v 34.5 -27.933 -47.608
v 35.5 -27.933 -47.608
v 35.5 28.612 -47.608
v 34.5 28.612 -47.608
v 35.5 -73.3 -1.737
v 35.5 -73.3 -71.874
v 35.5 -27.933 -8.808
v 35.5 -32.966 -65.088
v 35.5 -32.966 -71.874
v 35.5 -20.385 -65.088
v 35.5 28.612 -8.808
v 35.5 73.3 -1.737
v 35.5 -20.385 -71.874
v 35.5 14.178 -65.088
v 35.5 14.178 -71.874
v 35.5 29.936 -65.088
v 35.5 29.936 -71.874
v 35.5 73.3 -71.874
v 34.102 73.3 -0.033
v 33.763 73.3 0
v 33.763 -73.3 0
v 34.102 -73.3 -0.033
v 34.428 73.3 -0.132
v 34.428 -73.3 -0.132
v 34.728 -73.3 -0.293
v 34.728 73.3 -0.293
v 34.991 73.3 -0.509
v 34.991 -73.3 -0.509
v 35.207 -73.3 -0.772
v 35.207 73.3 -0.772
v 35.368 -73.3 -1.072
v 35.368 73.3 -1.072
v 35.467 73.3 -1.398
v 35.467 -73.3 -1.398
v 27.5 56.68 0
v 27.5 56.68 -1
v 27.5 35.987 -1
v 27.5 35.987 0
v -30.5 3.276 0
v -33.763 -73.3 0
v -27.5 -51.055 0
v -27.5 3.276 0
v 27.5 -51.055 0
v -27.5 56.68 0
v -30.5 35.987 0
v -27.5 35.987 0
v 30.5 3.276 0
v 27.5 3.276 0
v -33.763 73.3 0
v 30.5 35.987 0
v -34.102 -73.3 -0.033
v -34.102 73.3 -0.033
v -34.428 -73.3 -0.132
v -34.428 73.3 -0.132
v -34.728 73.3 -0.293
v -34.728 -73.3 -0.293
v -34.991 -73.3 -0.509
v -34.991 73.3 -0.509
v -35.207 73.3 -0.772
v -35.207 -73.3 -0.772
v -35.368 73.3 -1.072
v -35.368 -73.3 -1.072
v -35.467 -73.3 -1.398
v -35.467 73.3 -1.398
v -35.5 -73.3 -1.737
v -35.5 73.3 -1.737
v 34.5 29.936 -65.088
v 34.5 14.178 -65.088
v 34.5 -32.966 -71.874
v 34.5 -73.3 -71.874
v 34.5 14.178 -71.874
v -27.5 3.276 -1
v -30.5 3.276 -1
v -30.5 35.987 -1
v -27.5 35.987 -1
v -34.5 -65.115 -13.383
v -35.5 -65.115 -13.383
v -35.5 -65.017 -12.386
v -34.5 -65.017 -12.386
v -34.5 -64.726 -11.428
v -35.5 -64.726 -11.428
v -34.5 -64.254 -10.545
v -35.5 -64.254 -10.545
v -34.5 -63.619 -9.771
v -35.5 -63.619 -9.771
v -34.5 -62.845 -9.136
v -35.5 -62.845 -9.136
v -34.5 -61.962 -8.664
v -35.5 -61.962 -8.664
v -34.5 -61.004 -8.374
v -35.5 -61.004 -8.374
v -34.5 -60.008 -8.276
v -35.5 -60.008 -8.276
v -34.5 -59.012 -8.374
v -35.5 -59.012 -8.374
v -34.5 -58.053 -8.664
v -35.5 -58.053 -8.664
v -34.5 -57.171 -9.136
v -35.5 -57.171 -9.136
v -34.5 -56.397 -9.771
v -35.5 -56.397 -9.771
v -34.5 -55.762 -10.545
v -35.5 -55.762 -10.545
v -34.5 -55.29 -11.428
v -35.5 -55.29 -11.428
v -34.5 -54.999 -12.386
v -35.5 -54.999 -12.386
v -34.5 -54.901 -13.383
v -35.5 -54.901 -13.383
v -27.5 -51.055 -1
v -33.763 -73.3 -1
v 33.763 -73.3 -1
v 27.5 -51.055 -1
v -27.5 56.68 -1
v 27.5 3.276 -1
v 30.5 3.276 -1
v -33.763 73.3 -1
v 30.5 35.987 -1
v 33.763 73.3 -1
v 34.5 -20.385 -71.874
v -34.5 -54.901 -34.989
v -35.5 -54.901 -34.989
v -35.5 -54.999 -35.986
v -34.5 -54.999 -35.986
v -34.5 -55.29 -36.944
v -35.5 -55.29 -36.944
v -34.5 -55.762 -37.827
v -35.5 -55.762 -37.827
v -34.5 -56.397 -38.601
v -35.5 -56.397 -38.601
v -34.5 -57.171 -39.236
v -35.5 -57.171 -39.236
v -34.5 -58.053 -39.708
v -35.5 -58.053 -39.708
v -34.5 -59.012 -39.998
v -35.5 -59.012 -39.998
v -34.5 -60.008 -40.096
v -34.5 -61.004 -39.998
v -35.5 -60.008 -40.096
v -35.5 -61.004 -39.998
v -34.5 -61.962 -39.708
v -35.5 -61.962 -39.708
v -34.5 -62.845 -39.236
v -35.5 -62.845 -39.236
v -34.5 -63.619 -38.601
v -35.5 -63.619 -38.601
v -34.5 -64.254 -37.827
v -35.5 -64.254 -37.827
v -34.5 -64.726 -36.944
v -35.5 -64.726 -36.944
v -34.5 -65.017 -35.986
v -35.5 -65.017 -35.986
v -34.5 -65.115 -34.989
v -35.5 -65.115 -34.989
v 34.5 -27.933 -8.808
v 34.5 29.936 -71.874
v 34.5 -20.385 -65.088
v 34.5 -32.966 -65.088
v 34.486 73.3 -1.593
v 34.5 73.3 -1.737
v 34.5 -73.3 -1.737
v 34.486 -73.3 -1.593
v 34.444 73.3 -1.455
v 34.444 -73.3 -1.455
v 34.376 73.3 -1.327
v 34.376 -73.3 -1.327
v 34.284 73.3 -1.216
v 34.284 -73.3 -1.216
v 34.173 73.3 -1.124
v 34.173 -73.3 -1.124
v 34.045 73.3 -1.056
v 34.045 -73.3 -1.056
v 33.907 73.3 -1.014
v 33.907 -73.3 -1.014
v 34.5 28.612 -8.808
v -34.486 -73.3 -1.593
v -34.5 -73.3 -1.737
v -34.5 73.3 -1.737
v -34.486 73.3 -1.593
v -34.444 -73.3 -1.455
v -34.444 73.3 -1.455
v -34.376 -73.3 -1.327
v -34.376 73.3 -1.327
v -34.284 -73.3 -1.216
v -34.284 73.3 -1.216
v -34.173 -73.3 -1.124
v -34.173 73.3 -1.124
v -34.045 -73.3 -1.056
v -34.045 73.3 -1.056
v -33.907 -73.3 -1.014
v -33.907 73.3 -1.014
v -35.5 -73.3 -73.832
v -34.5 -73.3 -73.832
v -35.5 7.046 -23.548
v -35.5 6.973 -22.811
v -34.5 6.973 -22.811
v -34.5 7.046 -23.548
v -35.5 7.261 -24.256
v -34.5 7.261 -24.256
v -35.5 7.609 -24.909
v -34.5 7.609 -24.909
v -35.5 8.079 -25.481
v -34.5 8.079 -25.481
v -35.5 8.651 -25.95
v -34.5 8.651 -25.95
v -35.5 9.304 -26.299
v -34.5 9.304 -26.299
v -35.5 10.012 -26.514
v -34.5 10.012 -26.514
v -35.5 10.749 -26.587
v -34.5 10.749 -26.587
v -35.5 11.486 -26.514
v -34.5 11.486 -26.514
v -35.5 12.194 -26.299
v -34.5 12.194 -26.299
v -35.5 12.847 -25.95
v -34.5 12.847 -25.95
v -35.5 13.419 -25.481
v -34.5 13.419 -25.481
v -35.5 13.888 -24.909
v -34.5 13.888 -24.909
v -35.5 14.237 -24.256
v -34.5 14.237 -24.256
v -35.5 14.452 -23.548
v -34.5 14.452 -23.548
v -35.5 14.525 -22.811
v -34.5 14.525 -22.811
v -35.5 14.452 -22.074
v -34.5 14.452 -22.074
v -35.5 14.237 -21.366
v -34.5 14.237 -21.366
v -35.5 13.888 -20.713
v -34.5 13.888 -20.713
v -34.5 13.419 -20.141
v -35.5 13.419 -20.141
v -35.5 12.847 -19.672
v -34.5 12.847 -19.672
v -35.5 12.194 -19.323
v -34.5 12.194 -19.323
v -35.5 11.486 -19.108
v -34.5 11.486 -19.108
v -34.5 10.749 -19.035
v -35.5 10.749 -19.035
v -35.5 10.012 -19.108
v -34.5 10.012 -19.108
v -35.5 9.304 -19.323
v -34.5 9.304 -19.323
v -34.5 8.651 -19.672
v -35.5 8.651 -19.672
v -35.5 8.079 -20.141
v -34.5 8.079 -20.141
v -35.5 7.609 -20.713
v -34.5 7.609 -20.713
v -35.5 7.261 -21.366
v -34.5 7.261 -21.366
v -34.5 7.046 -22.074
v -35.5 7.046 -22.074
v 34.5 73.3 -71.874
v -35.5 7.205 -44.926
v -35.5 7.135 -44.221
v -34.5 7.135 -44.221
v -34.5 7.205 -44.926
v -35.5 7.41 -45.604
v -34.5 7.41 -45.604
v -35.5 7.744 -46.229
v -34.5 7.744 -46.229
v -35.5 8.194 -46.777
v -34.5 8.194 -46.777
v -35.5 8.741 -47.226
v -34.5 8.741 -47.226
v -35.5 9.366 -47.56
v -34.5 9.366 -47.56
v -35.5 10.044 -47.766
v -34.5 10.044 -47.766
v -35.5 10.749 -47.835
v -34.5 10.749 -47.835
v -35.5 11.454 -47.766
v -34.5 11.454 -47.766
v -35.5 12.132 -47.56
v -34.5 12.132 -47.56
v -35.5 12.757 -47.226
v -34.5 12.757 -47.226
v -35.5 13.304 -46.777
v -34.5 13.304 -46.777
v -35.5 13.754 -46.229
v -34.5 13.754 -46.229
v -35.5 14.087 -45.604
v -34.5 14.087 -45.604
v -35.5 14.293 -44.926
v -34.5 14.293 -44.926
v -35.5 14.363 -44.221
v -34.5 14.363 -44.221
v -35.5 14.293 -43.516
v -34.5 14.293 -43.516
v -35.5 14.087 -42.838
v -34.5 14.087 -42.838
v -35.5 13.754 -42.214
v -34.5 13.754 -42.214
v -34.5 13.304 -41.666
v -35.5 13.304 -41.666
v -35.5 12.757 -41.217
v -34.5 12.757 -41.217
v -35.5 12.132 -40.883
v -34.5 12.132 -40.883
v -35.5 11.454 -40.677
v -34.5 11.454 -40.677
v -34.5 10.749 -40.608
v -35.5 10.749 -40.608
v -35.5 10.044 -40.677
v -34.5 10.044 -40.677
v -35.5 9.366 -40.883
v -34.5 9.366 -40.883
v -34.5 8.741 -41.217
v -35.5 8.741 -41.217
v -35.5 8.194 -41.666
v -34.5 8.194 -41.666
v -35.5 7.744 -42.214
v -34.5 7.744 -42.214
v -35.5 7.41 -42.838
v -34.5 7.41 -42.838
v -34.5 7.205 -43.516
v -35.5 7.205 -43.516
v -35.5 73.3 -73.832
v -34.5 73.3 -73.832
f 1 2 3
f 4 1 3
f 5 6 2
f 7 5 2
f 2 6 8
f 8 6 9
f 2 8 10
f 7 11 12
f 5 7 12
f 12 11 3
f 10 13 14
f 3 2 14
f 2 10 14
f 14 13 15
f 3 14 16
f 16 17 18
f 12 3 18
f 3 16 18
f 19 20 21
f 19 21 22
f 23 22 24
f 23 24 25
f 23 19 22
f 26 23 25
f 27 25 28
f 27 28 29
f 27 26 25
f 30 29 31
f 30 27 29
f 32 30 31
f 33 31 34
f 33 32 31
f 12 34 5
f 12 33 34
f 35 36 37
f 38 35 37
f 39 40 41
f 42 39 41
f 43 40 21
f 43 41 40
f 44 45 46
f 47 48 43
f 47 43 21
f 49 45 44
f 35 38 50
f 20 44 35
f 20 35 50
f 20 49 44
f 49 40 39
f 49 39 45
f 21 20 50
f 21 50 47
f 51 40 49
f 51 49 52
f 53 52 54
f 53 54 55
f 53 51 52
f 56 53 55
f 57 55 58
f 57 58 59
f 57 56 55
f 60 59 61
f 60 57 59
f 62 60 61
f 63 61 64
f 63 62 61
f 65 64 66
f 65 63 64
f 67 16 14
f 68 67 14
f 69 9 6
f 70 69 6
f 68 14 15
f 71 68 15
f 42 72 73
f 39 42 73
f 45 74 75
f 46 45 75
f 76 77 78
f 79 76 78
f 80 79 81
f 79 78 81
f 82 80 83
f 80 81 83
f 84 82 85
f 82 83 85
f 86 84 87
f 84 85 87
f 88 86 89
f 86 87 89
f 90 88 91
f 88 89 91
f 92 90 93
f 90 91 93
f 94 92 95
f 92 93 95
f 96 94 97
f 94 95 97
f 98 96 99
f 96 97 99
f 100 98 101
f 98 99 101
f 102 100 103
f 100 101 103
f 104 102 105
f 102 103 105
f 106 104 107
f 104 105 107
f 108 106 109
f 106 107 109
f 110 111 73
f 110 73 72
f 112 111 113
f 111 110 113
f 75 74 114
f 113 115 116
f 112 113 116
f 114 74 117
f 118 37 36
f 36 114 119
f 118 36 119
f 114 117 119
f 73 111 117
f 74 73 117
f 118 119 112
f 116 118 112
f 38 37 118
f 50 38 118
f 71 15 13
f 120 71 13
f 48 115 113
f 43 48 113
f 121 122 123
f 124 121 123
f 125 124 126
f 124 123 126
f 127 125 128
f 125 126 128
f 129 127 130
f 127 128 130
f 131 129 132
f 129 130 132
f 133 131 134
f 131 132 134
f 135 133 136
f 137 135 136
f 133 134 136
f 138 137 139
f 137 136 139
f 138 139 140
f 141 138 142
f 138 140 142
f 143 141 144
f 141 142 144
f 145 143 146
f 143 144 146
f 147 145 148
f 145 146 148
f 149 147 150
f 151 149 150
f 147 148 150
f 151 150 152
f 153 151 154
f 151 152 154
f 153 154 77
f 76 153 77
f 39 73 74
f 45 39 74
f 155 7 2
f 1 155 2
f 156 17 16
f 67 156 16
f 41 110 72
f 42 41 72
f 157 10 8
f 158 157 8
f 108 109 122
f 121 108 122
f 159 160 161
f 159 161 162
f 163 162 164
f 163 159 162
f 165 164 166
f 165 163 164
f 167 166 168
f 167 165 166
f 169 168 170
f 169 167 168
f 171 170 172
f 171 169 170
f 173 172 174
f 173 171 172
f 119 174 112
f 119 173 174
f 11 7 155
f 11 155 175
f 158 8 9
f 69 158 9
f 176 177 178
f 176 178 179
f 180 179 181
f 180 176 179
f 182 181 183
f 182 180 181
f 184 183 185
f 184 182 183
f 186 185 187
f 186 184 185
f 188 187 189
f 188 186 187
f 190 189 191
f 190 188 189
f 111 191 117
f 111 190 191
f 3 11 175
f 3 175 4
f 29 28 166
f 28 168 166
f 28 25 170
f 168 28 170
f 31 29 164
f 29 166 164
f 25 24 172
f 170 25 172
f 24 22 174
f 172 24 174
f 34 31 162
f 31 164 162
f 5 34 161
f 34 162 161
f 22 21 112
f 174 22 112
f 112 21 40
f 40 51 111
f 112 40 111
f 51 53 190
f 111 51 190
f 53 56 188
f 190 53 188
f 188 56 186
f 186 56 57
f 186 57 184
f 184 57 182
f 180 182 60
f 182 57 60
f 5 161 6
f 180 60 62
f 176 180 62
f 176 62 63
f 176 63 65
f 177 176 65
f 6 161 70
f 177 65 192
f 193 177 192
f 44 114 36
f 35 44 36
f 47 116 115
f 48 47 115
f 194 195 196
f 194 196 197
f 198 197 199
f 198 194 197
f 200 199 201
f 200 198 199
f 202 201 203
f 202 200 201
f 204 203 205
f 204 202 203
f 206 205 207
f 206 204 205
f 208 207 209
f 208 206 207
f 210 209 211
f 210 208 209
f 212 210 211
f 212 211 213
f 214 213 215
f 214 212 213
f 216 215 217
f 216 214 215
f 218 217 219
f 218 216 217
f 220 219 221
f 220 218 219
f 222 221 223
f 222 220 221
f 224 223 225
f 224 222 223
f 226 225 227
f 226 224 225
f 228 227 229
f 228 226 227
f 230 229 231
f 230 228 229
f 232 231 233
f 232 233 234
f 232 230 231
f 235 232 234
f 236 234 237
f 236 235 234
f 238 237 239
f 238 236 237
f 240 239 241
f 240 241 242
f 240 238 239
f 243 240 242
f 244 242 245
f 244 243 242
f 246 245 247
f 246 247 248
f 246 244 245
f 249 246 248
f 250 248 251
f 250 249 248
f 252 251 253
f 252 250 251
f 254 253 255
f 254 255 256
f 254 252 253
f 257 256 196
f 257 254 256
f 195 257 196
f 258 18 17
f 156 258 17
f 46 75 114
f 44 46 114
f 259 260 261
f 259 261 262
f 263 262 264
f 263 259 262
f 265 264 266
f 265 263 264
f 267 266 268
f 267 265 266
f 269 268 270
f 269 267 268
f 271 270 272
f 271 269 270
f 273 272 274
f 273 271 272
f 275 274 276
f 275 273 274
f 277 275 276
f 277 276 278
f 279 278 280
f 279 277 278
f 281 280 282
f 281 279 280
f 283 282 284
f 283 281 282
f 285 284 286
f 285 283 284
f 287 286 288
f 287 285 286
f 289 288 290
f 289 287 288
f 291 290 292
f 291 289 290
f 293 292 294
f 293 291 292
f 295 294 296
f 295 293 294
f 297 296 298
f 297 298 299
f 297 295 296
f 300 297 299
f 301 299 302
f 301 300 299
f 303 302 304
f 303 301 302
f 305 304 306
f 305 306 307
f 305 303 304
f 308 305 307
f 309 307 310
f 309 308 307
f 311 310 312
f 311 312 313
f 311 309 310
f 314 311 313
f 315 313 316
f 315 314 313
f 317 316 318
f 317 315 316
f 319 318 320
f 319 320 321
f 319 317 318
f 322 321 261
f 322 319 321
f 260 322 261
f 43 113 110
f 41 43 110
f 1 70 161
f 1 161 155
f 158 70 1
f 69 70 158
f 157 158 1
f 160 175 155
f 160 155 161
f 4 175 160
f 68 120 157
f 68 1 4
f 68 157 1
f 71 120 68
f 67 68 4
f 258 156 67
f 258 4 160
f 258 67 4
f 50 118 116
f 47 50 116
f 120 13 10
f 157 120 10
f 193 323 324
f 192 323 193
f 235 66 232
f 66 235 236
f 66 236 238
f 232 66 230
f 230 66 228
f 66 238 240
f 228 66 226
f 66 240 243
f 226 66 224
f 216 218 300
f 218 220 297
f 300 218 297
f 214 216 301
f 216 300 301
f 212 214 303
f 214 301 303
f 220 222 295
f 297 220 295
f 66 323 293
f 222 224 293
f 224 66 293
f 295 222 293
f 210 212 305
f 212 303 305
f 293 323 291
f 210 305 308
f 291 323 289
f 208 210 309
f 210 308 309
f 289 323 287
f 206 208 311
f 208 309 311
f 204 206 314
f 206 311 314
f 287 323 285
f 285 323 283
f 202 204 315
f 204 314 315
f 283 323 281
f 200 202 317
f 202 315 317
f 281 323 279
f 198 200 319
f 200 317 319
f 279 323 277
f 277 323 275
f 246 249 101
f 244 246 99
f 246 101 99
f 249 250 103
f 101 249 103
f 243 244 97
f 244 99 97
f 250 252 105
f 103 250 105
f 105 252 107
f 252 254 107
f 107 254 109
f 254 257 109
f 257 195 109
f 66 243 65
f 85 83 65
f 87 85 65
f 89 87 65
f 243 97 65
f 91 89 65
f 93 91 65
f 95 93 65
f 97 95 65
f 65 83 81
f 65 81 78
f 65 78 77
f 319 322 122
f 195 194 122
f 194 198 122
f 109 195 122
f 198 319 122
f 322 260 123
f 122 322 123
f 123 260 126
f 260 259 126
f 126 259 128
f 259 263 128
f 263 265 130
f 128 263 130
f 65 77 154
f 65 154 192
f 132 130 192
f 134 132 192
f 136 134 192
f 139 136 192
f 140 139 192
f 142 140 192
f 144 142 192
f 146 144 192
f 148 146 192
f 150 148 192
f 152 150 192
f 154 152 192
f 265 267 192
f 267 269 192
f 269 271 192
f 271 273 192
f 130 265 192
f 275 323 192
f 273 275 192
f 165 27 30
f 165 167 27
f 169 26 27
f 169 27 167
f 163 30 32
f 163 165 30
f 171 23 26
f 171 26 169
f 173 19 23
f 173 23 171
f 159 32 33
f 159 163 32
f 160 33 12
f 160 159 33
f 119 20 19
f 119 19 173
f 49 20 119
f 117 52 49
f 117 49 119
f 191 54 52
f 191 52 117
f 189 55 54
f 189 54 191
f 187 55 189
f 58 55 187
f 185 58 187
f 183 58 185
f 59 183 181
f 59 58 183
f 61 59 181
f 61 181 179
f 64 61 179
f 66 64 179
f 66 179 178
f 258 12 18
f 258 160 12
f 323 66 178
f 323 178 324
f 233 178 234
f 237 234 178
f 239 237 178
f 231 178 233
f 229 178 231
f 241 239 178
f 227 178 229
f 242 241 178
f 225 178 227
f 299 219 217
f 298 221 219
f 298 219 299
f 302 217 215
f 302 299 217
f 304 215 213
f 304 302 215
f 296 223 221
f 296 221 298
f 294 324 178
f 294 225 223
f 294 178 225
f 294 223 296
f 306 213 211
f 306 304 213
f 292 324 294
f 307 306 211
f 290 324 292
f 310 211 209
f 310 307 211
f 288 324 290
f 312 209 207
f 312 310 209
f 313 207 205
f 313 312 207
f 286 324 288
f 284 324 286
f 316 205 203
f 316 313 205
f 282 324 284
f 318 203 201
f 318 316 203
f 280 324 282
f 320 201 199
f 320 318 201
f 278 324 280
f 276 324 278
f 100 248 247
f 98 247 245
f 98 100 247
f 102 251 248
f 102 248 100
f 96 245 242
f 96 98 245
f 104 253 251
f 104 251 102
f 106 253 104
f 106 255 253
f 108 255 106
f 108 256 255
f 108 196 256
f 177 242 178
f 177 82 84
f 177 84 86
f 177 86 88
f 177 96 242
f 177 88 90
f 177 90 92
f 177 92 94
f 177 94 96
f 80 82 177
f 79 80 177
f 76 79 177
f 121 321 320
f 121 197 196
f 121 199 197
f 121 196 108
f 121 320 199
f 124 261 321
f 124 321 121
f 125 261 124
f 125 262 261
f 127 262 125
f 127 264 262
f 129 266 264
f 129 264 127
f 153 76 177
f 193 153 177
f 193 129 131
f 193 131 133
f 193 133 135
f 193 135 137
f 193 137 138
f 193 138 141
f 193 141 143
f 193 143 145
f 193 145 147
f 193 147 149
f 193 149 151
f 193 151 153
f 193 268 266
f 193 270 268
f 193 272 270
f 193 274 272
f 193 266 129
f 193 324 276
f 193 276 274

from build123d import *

# Parameters (mm, degrees)
BASE_FLANGE1_START             = -1
BASE_FLANGE1_OUTLINE_W         = 71
BASE_FLANGE1_OUTLINE_H         = 146.600550732
BASE_FLANGE1_DEPTH             = 1
EDGE_FLANGE1_STRIP_W           = 5.4732
EDGE_FLANGE1_STRIP_H           = 1
EDGE_FLANGE1_STRIP_CUT_DEPTH   = 146.600550732
EDGE_FLANGE1_STRIP_2_W         = 5.4732
EDGE_FLANGE1_STRIP_2_H         = 1
EDGE_FLANGE1_STRIP_CUT_2_DEPTH = 146.600550732
EDGE_FLANGE1_DEPTH             = 146.600550732
EDGE_FLANGE1_PROFILE_W         = 56.545302405
EDGE_FLANGE1_PROFILE_H         = 38.800406569
EDGE_FLANGE1_FLAT_DEPTH        = 1
EDGE_FLANGE1_BEND_DEPTH        = 146.600550732
EDGE_FLANGE1_PROFILE_2_W       = 146.600550732
EDGE_FLANGE1_PROFILE_2_H       = 72.095455735
EDGE_FLANGE1_PROFILE_2_R       = 3.775798506
EDGE_FLANGE1_PROFILE_2_R_2     = 3.613625218
EDGE_FLANGE1_FLAT_2_DEPTH      = 1


# Read off the part's stored shape, not the designer's step: Base-Flange1
# Sheet-metal steps are written as plain solids
with BuildPart() as part:
    # Base-Flange1 outline → Base-Flange1 (new body)
    with BuildSketch(Plane.XY.offset(BASE_FLANGE1_START)):
        Rectangle(BASE_FLANGE1_OUTLINE_W, BASE_FLANGE1_OUTLINE_H)
        Polygon((27.5, 56.679661992), (27.5, 35.987332772), (30.5, 35.987332772), (30.5, 3.276208649), (27.5, 3.276208649), (27.5, -51.054712488), (-27.5, -51.054712488), (-27.5, 3.276208649), (-30.5, 3.276208649), (-30.5, 35.987332772), (-27.5, 35.987332772), (-27.5, 56.679661992), align=None, mode=Mode.SUBTRACT)
    extrude(amount=BASE_FLANGE1_DEPTH)

    # Edge-Flange1 strip (across the edge) → Edge-Flange1 strip cut (cut)
    with BuildSketch(Plane(origin=(35.5, 73.300275366, -1), x_dir=(-1, 0, 0), z_dir=(0, -1, 0))):
        with Locations((-1, -0.5)):
            Rectangle(EDGE_FLANGE1_STRIP_W, EDGE_FLANGE1_STRIP_H)
    extrude(amount=EDGE_FLANGE1_STRIP_CUT_DEPTH, mode=Mode.SUBTRACT)

    # Edge-Flange1 strip 2 (across the edge) → Edge-Flange1 strip cut 2 (cut)
    with BuildSketch(Plane(origin=(-35.5, -73.300275366, -1), x_dir=(1, 0, 0), z_dir=(0, 1, 0))):
        with Locations((-1, -0.5)):
            Rectangle(EDGE_FLANGE1_STRIP_2_W, EDGE_FLANGE1_STRIP_2_H)
    extrude(amount=EDGE_FLANGE1_STRIP_CUT_2_DEPTH, mode=Mode.SUBTRACT)

    # Edge-Flange1 bend section (across the edge) → Edge-Flange1 (add)
    with BuildSketch(Plane(origin=(35.5, 73.300275366, -1), x_dir=(-1, 0, 0), z_dir=(0, -1, 0))):
        with BuildLine():
            Line((0, 0.7366), (1, 0.7366))
            ThreePointArc((1, 0.7366), (1.215745145, 0.215745145), (1.7366, 0))
            Line((1.7366, 0), (1.7366, -1))
            ThreePointArc((1.7366, -1), (0.508638364, -0.491361636), (0, 0.7366))
        make_face()
    extrude(amount=EDGE_FLANGE1_DEPTH)

    # Edge-Flange1 profile (on flange) → Edge-Flange1 flat (add)
    with BuildSketch(Plane(origin=(35.5, 0, -1), x_dir=(0, 1, 0), z_dir=(-1, 0, 0))):
        Polygon((-20.385230208, 70.874104098), (-20.385230208, 64.088111139), (-32.965566809, 64.088111139), (-32.965566809, 70.874104098), (-73.300275366, 70.874104098), (-73.300275366, 0.7366), (73.300275366, 0.7366), (73.300275366, 70.874104098), (29.936116194, 70.874104098), (29.936116194, 64.088111139), (14.177589294, 64.088111139), (14.177589294, 70.874104098), align=None)
        with Locations((0.339219033, 27.20786121)):
            Rectangle(EDGE_FLANGE1_PROFILE_W, EDGE_FLANGE1_PROFILE_H, mode=Mode.SUBTRACT)
    extrude(amount=EDGE_FLANGE1_FLAT_DEPTH)

    # Edge-Flange1 bend section 2 (across the edge) → Edge-Flange1 bend (add)
    with BuildSketch(Plane(origin=(-35.5, -73.300275366, -1), x_dir=(1, 0, 0), z_dir=(0, 1, 0))):
        with BuildLine():
            Line((0, 0.7366), (1, 0.7366))
            ThreePointArc((1, 0.7366), (1.215745145, 0.215745145), (1.7366, 0))
            Line((1.7366, 0), (1.7366, -1))
            ThreePointArc((1.7366, -1), (0.508638364, -0.491361636), (0, 0.7366))
        make_face()
    extrude(amount=EDGE_FLANGE1_BEND_DEPTH)

    # Edge-Flange1 profile 2 (on flange) → Edge-Flange1 flat 2 (add)
    with BuildSketch(Plane(origin=(-35.5, 0, -1), x_dir=(0, -1, 0), z_dir=(1, 0, 0))):
        with Locations((0, 36.784327868)):
            Rectangle(EDGE_FLANGE1_PROFILE_2_W, EDGE_FLANGE1_PROFILE_2_H)
        with BuildLine():
            ThreePointArc((65.114919352, 12.382584554), (60.007866854, 7.275532056), (54.900814356, 12.382584554))
            Line((54.900814356, 12.382584554), (54.900814356, 33.989345124))
            ThreePointArc((54.900814356, 33.989345124), (60.007866854, 39.096397622), (65.114919352, 33.989345124))
            Line((65.114919352, 33.989345124), (65.114919352, 12.382584554))
        make_face(mode=Mode.SUBTRACT)
        with Locations((-10.748889417, 21.810989166)):
            Circle(EDGE_FLANGE1_PROFILE_2_R, mode=Mode.SUBTRACT)
        with Locations((-10.748889417, 43.22132464)):
            Circle(EDGE_FLANGE1_PROFILE_2_R_2, mode=Mode.SUBTRACT)
    extrude(amount=EDGE_FLANGE1_FLAT_2_DEPTH)


solid = part.part
